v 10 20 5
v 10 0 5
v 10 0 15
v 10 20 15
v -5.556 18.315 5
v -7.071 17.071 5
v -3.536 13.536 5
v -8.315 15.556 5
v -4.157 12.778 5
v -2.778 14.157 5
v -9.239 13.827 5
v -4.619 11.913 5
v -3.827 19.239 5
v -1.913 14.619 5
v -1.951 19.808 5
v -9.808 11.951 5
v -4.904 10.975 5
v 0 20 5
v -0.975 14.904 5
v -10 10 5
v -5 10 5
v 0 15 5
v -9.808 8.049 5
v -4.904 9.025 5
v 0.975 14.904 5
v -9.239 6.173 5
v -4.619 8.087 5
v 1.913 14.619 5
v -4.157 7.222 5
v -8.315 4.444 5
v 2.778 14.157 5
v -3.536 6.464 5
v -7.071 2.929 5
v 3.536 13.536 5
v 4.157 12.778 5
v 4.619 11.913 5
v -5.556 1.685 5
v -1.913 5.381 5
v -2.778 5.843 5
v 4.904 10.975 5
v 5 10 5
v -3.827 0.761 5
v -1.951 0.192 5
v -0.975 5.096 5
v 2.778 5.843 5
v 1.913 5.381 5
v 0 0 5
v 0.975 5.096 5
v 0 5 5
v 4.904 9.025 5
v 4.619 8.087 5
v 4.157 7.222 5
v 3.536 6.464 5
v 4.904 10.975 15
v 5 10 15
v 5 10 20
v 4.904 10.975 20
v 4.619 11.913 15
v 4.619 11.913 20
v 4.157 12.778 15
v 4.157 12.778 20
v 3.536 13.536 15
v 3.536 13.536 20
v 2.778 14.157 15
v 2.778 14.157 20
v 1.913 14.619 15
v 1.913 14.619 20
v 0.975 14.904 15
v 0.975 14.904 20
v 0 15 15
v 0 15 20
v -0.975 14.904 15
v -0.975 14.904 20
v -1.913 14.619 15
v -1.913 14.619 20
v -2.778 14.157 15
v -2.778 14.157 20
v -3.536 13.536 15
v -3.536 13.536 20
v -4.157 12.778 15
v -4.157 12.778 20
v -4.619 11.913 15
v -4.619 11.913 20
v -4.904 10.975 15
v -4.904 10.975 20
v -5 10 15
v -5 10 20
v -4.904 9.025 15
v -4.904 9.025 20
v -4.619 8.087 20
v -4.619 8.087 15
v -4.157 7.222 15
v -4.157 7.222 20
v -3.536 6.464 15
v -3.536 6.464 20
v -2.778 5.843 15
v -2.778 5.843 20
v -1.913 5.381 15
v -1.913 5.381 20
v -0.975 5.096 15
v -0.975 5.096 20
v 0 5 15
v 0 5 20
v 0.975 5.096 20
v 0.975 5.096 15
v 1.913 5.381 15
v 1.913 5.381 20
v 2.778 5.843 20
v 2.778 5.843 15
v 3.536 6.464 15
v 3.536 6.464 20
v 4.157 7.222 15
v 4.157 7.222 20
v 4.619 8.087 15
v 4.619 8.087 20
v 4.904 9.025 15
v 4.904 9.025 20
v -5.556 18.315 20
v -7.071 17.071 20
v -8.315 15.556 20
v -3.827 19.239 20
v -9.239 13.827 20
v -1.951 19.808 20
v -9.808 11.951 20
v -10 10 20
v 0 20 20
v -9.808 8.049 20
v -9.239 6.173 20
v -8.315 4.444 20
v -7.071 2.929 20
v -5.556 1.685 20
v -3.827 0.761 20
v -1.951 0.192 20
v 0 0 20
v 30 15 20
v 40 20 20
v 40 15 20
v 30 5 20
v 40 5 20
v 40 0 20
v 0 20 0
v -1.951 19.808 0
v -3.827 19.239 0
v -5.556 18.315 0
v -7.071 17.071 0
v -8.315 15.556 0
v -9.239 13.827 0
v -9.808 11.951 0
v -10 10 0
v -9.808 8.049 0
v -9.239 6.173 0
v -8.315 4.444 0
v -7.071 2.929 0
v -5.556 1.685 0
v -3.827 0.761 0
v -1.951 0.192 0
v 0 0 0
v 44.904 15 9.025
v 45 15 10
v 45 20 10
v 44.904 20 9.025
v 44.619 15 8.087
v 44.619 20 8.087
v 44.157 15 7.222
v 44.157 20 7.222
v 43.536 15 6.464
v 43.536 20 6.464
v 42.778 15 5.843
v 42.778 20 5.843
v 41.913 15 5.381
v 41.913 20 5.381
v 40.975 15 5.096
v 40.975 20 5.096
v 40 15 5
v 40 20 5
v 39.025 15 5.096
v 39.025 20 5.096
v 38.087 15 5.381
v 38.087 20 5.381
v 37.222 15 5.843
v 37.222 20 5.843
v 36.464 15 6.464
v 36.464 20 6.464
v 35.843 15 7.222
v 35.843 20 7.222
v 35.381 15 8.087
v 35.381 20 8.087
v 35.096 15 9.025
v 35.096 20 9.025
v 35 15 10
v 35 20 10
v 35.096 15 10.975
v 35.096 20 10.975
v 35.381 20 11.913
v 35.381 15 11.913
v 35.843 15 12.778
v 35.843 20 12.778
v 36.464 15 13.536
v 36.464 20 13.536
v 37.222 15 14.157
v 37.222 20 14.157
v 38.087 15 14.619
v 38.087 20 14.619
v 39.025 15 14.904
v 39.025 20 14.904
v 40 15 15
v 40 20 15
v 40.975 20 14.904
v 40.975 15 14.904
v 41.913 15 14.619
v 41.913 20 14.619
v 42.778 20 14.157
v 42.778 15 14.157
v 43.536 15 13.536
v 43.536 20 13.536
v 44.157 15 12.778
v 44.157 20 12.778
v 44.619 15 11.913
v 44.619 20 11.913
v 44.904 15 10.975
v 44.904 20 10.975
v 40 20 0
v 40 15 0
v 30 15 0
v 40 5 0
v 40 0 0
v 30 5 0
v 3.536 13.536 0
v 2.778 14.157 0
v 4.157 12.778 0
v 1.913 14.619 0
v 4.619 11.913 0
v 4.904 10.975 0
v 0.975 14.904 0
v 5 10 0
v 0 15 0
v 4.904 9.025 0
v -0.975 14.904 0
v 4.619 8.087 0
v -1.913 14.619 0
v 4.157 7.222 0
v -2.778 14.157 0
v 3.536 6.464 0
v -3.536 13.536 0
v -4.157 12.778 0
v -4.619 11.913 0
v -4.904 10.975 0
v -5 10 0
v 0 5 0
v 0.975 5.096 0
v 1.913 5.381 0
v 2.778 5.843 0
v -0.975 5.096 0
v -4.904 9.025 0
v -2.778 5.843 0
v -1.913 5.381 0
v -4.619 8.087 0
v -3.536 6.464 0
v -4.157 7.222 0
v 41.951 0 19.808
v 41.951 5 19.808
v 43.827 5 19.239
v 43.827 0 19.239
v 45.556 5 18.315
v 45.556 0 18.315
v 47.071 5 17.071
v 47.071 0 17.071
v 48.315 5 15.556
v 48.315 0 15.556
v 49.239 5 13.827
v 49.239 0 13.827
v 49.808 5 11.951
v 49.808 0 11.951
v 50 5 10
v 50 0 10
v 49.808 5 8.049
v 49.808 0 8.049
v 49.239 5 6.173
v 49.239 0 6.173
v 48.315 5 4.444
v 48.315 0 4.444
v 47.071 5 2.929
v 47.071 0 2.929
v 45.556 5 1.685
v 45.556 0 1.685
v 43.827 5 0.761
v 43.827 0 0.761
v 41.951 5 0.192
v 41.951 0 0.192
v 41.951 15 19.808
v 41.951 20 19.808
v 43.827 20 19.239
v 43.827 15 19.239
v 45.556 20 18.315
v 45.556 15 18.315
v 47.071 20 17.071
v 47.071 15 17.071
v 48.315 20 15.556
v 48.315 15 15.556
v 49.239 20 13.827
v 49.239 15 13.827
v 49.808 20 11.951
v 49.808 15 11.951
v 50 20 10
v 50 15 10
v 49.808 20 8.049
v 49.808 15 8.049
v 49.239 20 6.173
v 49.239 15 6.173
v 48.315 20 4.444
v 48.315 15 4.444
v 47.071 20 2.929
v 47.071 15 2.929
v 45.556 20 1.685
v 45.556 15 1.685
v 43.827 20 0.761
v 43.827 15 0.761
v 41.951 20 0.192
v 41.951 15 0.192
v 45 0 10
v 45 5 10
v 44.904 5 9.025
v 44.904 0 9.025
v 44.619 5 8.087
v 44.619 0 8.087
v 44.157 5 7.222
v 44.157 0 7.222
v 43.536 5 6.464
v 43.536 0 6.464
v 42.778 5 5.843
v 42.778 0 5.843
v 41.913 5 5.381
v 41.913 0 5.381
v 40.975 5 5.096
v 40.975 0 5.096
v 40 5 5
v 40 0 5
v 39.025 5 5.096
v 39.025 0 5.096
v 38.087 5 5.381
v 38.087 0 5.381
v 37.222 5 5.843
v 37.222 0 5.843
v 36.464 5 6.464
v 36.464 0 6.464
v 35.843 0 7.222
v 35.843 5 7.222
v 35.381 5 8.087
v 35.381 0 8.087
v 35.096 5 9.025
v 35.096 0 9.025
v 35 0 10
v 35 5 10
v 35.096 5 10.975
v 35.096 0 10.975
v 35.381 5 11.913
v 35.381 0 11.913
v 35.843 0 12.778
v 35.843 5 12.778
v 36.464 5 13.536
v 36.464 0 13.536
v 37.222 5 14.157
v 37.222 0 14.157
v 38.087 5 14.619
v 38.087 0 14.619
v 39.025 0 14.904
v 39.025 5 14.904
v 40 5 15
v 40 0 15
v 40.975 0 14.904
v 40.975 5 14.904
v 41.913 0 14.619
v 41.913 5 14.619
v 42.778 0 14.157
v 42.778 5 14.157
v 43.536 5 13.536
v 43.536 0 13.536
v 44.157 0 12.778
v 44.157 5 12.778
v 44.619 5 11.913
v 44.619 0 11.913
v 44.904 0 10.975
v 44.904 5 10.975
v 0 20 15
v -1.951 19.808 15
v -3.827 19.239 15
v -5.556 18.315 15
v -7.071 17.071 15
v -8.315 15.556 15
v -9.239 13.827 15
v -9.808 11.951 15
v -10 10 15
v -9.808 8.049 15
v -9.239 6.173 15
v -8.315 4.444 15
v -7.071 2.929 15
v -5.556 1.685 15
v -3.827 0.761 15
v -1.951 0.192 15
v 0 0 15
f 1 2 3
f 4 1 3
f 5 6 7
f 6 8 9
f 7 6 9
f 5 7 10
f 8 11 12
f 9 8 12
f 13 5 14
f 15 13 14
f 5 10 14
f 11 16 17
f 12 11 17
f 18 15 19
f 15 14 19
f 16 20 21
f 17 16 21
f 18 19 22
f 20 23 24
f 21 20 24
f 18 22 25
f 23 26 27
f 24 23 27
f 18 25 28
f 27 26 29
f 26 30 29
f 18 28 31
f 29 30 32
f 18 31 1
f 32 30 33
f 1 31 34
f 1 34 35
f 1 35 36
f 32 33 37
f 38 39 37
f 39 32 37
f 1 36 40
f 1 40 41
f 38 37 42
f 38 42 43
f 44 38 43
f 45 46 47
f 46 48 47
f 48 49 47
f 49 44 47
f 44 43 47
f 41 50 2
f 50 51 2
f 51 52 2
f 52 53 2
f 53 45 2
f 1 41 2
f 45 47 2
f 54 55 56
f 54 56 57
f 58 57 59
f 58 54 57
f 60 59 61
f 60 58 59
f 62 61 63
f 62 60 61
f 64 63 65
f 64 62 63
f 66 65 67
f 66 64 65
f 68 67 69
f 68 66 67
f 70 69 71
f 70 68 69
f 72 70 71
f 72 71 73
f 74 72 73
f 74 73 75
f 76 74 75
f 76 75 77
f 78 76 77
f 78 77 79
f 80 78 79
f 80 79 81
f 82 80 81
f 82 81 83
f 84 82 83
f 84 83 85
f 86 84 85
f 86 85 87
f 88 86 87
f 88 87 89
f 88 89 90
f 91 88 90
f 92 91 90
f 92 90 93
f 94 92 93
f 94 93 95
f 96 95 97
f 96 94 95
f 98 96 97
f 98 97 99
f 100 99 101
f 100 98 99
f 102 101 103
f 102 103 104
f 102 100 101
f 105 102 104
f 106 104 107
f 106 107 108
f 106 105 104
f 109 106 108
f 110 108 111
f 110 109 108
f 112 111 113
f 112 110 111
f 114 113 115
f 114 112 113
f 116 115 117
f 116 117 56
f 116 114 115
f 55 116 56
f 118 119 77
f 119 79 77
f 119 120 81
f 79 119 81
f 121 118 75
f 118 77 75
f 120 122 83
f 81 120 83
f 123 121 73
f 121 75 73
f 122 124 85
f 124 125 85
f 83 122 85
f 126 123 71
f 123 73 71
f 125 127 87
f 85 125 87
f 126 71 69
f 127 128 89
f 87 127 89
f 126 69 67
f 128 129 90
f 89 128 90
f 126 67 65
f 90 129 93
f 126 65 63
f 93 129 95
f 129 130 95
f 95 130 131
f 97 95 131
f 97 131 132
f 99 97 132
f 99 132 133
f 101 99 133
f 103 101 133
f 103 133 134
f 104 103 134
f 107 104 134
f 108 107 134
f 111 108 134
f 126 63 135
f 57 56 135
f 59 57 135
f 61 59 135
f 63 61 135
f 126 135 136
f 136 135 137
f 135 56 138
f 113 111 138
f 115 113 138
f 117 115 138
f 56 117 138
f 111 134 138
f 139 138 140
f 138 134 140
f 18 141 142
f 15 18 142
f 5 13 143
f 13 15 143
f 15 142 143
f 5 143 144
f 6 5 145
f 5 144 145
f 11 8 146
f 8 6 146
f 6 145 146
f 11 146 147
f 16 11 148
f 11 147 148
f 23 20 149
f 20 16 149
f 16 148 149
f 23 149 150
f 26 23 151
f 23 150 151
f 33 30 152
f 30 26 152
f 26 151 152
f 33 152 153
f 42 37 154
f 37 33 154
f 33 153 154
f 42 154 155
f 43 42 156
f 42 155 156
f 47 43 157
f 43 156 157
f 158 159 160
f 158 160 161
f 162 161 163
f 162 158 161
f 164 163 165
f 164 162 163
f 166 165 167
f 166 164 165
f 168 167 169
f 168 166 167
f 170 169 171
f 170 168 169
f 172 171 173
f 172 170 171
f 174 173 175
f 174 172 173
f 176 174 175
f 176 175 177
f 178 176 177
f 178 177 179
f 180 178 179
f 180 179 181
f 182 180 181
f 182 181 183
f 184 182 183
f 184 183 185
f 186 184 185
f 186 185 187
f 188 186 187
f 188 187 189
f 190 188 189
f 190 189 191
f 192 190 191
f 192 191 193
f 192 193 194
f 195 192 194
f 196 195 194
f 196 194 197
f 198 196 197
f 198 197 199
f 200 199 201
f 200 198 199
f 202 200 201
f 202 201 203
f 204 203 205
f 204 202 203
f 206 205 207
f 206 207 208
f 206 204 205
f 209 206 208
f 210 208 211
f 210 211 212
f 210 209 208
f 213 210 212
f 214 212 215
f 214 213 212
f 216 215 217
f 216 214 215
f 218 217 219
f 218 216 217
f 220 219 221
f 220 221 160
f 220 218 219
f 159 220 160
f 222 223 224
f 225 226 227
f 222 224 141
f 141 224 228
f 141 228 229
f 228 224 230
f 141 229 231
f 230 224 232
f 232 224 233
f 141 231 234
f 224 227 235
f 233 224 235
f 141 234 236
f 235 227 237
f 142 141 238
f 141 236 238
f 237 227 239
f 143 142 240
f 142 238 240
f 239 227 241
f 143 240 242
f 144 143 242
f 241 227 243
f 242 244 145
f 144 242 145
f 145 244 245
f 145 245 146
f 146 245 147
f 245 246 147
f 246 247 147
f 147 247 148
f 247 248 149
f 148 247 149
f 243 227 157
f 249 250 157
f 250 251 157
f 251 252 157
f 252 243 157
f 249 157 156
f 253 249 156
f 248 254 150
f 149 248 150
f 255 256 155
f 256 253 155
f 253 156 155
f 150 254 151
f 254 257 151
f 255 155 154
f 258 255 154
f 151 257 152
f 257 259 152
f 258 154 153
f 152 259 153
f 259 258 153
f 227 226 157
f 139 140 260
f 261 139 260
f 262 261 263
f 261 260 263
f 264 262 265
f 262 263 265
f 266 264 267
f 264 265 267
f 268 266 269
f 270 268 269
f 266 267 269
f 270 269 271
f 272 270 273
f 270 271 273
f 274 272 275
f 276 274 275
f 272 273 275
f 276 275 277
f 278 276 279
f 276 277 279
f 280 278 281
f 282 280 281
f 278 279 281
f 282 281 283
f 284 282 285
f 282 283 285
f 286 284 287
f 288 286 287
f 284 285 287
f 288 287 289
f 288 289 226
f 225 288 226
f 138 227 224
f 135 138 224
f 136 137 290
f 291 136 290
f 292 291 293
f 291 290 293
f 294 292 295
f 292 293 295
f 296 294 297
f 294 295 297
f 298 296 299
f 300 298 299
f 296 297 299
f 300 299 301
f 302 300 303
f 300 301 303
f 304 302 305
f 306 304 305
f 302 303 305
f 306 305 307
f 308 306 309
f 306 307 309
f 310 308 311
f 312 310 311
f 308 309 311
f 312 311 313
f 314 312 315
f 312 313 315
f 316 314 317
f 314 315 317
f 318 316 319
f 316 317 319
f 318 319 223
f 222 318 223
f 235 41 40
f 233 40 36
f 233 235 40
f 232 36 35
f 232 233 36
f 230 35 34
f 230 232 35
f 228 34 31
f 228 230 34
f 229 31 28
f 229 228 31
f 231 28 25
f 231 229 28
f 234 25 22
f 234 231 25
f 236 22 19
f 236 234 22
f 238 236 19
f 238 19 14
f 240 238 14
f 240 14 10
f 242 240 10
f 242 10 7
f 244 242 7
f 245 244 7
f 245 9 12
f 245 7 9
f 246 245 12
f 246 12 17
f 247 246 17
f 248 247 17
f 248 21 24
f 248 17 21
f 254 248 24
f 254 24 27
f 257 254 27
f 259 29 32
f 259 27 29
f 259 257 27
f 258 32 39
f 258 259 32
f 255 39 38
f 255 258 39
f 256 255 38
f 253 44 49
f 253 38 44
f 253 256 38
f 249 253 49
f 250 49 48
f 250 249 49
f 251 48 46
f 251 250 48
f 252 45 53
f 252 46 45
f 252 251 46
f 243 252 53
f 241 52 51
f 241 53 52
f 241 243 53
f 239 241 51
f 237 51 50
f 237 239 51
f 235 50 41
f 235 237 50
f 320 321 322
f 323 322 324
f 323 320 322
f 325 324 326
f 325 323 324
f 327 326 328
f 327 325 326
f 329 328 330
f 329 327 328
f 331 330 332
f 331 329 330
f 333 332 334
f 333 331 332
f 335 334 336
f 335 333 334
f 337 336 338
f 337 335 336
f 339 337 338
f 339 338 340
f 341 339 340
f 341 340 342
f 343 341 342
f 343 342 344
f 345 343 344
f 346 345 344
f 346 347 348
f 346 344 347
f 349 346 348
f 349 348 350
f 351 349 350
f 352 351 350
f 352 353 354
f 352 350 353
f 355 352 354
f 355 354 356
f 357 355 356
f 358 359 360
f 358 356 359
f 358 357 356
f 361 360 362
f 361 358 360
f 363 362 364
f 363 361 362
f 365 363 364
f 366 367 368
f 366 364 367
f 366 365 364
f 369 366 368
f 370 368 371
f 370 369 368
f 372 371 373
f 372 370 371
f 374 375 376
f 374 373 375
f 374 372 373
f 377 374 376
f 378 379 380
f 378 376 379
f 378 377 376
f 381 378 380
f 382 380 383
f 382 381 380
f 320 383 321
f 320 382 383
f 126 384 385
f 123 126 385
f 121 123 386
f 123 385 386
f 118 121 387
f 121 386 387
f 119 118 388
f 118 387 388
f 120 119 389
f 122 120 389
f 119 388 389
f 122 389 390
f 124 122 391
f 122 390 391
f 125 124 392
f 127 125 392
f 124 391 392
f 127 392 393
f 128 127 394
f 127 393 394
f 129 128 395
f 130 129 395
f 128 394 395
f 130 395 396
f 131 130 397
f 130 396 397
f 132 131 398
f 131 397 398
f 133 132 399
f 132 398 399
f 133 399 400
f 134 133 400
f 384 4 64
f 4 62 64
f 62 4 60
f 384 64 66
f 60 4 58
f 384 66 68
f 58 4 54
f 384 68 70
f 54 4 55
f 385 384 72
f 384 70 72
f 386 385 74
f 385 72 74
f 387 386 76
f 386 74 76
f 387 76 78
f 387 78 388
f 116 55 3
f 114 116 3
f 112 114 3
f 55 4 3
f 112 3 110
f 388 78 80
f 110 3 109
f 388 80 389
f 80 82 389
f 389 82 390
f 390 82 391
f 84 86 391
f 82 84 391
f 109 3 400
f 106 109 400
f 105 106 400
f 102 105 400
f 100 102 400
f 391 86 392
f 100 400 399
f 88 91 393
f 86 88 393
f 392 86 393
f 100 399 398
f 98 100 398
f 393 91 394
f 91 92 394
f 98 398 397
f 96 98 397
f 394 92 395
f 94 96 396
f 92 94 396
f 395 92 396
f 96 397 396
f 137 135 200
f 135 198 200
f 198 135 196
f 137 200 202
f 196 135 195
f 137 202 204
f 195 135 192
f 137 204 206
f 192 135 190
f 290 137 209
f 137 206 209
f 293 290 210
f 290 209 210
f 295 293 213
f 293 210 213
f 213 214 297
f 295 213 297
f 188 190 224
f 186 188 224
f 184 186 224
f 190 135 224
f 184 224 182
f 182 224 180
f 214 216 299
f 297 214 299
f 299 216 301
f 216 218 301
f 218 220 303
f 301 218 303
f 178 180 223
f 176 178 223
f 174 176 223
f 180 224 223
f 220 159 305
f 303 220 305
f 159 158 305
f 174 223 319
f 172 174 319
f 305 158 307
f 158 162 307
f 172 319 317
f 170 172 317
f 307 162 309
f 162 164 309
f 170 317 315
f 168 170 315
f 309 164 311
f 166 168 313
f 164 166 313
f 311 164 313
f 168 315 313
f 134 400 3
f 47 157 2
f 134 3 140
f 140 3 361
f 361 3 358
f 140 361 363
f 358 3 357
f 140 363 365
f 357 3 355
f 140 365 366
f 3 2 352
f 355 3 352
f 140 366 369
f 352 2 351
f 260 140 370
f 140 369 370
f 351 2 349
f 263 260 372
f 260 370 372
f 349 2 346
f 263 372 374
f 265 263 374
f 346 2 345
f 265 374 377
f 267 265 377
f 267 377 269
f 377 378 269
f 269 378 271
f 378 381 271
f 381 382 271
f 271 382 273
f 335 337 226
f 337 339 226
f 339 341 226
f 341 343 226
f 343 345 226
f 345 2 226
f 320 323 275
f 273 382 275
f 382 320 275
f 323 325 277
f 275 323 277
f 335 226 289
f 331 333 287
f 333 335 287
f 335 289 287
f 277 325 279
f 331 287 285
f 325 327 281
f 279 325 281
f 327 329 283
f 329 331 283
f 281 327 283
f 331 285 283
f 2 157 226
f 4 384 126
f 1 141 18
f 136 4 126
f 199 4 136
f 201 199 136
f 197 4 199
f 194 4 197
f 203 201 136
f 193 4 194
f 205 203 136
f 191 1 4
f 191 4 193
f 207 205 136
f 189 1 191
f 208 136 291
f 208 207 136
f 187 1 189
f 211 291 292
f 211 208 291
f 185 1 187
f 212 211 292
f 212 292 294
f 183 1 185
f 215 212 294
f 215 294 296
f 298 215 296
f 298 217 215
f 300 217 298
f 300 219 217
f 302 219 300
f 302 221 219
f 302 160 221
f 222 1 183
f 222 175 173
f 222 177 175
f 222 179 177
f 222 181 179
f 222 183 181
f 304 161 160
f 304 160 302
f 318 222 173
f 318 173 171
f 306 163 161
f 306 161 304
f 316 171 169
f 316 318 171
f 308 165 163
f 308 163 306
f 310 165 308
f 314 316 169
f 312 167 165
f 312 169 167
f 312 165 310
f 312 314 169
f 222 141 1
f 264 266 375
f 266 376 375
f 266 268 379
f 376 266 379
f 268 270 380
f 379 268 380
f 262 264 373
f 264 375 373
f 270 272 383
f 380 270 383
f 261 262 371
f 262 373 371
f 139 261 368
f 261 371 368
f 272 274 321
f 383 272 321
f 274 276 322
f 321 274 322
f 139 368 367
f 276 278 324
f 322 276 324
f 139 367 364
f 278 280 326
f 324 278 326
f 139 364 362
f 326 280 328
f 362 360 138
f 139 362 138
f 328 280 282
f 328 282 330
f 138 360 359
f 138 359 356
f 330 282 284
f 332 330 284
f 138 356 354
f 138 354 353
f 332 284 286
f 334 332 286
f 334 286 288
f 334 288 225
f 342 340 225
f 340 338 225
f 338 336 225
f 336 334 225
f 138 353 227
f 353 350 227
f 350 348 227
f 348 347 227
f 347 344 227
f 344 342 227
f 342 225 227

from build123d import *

# Parameters (mm, degrees)
ESQUISSE1_R        = 5
BOSS_EXTRU_1_DEPTH = 20
ESQUISSE2_R        = 5
BOSS_EXTRU_2_DEPTH = 20


with BuildPart() as part:
    # Esquisse1 → Boss.-Extru.1 (new body)
    with BuildSketch(Plane.XY):
        with BuildLine():
            Line((0, 0), (50, 0))
            Line((50, 0), (50, 5))
            Line((50, 5), (30, 5))
            Line((30, 5), (30, 15))
            Line((30, 15), (50, 15))
            Line((50, 15), (50, 20))
            Line((50, 20), (0, 20))
            ThreePointArc((0, 20), (-10, 10), (0, 0))
        make_face()
        with Locations((0, 10)):
            Circle(ESQUISSE1_R, mode=Mode.SUBTRACT)
    extrude(amount=BOSS_EXTRU_1_DEPTH)


with BuildPart() as body_2:
    # Esquisse2 → Boss.-Extru.2 (new body)
    with BuildSketch(Plane(origin=(0, 0, 0), x_dir=(1, 0, 0), z_dir=(0, 1, 0))):
        with BuildLine():
            Line((40, 0), (-10, 0))
            Line((-10, 0), (-10, -5))
            Line((-10, -5), (10, -5))
            Line((10, -5), (10, -15))
            Line((10, -15), (-10, -15))
            Line((-10, -15), (-10, -20))
            Line((-10, -20), (40, -20))
            ThreePointArc((40, -20), (50, -10), (40, 0))
        make_face()
        with Locations((40, -10)):
            Circle(ESQUISSE2_R, mode=Mode.SUBTRACT)
    extrude(amount=BOSS_EXTRU_2_DEPTH)

    # Combiner1: intersect part
    add(part.part, mode=Mode.INTERSECT)


solid = body_2.part
